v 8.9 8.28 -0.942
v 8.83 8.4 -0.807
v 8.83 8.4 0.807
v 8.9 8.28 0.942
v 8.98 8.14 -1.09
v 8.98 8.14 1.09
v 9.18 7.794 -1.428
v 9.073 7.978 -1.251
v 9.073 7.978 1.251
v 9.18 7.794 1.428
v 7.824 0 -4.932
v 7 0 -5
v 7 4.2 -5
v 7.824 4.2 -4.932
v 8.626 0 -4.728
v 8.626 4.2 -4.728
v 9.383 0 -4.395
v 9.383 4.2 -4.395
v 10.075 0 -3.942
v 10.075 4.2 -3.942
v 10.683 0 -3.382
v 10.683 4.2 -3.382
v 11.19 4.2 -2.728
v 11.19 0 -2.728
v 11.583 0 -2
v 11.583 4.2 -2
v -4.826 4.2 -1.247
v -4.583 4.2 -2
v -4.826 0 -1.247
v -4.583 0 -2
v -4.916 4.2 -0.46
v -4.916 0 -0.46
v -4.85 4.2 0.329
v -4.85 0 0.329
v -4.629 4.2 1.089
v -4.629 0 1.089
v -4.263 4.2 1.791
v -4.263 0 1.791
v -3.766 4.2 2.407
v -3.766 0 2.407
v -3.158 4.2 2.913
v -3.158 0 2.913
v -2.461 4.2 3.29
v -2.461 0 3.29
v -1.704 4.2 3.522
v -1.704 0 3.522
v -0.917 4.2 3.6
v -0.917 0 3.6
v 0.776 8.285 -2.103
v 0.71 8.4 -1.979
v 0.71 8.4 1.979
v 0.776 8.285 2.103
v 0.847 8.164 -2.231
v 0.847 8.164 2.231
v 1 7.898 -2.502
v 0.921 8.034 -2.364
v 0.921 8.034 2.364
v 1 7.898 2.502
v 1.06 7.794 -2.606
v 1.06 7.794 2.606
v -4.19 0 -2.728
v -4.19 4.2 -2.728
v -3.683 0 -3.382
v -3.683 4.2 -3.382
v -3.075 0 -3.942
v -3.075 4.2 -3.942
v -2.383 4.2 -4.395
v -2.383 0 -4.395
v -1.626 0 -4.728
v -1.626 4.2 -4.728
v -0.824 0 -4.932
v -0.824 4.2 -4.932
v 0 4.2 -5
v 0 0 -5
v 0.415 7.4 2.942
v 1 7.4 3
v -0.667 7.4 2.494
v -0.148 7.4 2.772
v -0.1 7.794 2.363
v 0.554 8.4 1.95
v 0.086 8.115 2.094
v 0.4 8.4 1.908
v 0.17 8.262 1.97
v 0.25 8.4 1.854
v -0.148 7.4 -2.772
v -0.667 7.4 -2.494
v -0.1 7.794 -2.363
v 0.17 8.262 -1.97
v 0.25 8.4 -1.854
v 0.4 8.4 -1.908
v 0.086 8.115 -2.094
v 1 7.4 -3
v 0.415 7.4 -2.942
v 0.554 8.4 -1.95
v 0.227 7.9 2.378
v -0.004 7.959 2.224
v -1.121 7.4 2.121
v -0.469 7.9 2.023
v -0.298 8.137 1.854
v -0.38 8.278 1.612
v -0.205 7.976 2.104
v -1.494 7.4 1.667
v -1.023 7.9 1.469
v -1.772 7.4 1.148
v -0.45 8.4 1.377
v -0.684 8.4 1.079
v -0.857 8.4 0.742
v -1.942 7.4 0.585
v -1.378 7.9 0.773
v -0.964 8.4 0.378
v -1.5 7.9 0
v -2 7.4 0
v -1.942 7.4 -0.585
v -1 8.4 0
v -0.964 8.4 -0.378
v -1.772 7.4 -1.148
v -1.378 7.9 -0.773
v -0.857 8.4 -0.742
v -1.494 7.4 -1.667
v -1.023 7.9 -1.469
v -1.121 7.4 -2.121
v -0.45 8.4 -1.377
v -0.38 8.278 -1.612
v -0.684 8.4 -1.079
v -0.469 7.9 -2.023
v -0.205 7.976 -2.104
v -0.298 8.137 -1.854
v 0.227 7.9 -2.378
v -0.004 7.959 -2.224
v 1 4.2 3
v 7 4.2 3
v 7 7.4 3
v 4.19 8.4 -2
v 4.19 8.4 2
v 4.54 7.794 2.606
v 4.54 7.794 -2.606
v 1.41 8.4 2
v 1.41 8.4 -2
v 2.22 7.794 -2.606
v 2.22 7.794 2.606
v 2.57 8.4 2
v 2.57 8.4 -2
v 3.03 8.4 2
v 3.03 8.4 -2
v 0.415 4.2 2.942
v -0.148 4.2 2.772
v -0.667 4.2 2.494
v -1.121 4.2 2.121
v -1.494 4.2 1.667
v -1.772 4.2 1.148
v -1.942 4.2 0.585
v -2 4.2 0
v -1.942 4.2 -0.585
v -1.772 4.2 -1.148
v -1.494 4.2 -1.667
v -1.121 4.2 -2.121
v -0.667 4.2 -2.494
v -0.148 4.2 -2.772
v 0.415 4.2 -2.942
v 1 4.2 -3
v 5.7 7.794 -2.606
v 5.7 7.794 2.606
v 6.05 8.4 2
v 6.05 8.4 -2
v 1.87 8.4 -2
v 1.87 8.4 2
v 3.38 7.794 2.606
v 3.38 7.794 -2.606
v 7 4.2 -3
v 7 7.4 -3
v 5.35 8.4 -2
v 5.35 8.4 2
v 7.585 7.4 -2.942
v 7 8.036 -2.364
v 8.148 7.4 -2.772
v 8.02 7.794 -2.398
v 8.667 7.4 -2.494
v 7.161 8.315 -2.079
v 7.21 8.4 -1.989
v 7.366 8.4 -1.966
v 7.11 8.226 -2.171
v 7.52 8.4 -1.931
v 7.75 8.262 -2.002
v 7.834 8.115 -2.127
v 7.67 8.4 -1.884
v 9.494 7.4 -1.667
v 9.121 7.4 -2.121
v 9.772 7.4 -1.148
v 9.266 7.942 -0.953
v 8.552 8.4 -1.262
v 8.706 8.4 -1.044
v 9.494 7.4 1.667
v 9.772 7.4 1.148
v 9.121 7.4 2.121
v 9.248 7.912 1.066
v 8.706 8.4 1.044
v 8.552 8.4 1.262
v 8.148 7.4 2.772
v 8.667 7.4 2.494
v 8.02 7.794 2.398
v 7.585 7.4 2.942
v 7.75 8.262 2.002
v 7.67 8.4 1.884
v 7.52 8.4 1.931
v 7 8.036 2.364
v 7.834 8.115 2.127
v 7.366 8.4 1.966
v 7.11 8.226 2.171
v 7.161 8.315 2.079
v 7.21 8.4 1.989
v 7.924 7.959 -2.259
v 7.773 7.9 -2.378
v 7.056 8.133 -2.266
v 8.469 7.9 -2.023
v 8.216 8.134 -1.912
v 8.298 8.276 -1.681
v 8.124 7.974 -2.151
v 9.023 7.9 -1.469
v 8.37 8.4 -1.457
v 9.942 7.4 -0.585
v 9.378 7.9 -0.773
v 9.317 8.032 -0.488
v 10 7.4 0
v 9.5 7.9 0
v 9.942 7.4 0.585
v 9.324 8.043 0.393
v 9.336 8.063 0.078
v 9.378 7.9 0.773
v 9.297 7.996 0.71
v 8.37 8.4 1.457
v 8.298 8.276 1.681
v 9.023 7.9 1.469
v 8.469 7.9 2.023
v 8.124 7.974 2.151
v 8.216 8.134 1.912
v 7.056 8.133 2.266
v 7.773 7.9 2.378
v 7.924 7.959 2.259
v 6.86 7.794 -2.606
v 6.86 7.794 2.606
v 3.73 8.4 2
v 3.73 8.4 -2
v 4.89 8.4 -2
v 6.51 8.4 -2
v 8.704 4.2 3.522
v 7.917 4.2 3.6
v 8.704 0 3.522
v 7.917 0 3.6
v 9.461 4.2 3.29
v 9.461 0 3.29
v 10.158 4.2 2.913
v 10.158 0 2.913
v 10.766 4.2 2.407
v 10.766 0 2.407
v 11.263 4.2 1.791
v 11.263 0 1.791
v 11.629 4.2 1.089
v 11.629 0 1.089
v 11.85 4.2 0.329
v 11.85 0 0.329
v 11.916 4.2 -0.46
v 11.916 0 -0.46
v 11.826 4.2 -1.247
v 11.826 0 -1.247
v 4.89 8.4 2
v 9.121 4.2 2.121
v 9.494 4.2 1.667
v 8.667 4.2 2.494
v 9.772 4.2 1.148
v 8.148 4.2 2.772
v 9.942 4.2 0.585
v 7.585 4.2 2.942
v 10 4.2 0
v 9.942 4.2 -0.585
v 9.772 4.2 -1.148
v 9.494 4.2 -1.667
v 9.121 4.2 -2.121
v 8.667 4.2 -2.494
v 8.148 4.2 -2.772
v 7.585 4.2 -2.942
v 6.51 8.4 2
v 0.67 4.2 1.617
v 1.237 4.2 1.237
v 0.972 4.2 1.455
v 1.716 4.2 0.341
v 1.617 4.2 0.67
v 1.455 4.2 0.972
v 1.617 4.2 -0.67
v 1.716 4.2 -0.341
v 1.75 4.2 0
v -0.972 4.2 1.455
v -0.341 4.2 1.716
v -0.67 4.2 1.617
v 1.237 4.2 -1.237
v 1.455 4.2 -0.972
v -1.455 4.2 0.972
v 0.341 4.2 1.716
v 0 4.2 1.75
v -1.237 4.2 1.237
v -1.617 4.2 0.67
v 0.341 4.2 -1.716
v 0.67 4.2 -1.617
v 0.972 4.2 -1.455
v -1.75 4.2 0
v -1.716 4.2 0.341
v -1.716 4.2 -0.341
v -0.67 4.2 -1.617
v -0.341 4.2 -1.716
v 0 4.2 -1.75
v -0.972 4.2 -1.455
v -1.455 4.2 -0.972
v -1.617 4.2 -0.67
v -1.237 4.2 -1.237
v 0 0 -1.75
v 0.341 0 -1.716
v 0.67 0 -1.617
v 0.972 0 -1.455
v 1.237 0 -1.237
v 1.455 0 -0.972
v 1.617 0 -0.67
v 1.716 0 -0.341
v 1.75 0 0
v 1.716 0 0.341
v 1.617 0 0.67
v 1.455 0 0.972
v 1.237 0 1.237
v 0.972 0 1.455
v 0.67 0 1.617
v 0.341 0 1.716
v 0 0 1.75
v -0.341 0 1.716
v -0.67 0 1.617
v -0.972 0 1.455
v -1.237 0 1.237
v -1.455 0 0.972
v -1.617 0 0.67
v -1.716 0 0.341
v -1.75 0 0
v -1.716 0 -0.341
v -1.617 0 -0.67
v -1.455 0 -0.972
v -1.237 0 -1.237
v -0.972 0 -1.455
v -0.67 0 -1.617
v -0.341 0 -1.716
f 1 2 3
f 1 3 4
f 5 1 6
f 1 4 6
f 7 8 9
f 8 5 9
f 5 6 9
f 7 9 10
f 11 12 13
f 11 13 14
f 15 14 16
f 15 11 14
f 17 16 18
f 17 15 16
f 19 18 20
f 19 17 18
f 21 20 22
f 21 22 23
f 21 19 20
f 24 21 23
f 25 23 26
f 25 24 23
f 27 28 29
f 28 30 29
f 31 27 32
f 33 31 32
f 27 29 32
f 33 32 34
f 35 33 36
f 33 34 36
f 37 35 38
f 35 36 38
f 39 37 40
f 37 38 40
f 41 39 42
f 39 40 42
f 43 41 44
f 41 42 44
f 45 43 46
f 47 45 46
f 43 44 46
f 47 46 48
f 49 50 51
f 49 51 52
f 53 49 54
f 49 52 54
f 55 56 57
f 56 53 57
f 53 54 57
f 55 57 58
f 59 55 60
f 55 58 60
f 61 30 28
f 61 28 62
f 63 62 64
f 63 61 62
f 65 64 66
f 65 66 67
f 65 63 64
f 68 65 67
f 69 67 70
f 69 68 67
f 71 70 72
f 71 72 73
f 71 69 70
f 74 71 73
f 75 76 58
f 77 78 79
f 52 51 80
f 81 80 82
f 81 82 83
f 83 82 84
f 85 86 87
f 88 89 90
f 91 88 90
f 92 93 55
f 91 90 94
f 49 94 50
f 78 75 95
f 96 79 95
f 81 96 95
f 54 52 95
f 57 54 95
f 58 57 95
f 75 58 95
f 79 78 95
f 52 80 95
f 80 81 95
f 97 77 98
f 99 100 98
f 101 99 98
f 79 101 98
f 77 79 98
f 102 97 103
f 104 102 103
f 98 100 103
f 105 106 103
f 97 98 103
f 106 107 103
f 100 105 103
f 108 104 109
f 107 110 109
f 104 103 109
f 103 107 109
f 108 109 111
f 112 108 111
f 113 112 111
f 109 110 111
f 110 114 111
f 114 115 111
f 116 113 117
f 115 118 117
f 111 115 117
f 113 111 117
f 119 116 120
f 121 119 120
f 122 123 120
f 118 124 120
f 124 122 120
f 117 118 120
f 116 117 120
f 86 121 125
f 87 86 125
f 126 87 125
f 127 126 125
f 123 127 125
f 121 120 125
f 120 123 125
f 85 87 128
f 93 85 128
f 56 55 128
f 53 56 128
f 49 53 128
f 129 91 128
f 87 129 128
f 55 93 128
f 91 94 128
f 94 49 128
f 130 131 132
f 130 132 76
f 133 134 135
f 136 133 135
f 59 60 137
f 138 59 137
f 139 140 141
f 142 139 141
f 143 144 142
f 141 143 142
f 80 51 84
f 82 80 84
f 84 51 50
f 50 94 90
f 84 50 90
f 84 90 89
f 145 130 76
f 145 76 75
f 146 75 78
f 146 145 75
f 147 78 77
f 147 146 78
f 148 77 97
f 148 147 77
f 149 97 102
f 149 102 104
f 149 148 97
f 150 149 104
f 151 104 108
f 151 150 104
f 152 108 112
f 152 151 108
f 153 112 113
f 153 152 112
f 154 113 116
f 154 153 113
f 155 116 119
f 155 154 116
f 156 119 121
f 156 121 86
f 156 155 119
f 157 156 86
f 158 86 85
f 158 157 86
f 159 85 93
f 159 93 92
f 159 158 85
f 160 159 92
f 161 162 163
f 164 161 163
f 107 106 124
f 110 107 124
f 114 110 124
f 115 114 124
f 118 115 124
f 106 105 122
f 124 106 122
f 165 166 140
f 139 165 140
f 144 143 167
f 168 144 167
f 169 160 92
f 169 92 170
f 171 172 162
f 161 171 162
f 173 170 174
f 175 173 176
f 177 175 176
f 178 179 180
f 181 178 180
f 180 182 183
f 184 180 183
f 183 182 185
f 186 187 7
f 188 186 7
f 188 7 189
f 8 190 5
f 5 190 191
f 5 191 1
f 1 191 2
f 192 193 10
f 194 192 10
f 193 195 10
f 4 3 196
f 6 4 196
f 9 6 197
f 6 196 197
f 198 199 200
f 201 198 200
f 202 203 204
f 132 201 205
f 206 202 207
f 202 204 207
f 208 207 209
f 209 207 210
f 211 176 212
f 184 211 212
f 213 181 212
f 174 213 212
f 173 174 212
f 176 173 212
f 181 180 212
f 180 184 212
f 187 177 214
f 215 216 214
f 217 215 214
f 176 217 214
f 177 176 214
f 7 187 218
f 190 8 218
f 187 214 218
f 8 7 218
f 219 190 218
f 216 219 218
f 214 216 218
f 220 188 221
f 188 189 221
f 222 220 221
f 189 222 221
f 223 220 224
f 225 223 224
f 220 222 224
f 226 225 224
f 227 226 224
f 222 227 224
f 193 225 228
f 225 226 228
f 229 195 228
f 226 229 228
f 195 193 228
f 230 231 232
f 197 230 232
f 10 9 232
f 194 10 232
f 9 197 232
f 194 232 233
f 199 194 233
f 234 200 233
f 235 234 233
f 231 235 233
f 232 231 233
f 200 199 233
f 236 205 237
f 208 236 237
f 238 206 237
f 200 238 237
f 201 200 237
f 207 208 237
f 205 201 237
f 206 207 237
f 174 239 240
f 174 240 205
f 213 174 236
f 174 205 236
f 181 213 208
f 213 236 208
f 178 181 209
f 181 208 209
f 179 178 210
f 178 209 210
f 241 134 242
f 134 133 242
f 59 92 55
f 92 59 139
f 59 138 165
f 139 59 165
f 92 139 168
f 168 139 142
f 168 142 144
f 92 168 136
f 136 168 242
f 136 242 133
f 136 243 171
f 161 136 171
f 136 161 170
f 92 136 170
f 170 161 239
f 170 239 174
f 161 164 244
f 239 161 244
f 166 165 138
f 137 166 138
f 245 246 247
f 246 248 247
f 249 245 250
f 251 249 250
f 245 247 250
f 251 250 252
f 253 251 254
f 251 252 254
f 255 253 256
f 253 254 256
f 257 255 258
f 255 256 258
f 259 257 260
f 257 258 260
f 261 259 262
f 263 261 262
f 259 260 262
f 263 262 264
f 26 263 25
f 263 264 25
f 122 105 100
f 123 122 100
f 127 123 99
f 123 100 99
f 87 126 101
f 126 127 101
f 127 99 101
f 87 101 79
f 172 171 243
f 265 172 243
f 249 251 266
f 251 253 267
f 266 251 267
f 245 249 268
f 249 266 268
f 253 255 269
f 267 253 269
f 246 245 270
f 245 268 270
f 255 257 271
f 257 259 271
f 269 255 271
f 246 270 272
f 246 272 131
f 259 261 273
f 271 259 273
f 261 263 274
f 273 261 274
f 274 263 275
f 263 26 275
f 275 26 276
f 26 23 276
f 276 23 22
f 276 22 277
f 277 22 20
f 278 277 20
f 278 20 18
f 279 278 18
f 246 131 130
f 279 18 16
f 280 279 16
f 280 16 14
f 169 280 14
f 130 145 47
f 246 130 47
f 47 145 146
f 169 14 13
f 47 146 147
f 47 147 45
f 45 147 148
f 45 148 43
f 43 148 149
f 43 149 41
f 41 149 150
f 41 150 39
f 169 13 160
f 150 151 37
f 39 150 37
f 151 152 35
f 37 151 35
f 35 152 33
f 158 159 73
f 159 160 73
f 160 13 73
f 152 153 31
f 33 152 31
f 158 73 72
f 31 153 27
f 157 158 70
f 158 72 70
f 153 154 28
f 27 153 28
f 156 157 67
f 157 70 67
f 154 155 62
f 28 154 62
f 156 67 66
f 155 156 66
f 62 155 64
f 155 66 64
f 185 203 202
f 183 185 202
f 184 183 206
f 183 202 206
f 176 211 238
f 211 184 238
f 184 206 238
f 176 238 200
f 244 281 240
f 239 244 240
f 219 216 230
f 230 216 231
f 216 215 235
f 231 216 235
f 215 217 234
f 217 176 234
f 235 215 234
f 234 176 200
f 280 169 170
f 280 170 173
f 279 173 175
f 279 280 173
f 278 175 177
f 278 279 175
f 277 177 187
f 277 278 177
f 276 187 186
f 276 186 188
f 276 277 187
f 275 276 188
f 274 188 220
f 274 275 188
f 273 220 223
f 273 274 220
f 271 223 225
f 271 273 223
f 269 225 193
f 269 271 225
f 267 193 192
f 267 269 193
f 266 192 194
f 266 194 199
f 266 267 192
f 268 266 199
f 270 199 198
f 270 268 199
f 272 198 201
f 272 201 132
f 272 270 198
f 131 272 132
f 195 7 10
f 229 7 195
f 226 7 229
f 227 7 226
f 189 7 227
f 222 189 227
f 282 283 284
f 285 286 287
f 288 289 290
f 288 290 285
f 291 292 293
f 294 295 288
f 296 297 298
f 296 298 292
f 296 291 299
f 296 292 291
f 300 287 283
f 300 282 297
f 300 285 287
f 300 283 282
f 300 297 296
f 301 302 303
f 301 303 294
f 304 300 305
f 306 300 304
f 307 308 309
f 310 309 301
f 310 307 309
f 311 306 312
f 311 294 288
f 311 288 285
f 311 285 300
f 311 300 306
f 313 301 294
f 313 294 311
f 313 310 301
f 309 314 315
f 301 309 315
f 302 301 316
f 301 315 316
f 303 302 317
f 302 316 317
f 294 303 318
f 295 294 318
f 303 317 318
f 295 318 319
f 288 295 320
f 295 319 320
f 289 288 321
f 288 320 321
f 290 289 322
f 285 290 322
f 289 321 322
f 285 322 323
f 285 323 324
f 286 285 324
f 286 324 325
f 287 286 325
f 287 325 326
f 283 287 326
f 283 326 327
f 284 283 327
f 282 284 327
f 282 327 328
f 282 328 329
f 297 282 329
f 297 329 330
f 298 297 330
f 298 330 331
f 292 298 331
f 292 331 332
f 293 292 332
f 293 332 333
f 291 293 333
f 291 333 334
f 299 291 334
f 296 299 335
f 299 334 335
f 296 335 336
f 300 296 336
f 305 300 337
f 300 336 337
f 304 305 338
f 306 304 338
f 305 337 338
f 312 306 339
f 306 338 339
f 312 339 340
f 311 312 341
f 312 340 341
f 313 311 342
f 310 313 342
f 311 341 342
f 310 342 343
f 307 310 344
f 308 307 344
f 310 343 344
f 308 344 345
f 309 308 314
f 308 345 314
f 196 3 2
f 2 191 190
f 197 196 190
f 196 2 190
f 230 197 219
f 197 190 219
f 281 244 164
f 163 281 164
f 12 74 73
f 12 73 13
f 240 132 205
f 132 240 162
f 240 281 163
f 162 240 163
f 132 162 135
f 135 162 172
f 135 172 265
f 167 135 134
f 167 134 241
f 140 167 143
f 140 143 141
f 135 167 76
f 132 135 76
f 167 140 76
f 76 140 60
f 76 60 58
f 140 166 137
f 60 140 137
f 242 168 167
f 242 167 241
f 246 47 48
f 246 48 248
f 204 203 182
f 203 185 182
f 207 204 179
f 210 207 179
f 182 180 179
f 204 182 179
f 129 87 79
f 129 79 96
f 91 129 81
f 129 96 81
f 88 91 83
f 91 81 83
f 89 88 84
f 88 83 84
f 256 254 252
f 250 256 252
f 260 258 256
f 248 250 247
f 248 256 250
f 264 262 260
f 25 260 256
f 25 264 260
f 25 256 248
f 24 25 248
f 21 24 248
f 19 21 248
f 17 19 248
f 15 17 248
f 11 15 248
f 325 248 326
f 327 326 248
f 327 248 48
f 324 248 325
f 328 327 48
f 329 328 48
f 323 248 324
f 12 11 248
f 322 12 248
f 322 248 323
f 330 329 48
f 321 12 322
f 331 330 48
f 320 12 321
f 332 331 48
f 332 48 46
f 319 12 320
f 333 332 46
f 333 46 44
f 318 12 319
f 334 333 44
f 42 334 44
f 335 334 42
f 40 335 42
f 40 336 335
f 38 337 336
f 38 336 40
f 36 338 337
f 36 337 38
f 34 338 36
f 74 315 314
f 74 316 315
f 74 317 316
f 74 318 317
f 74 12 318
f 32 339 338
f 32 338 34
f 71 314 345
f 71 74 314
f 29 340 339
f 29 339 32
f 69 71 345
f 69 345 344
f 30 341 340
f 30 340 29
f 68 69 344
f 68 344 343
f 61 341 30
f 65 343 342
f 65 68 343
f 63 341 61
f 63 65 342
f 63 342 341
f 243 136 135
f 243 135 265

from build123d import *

# Parameters (mm, degrees)
EXTRUDE_1_DEPTH     = 4.2
CUT_EXTRUDE_1_REACH = 15.662
SKETCH_3_R          = 1.75
EXTRUDE_2_DEPTH     = 4.2
CHAMFER_1_SIZE      = 1
CUT_EXTRUDE_2_REACH = 15.662
SKETCH_5_W          = 13.93974063
SKETCH_5_H          = 1.4
FILLET_1_R          = 4
CUT_EXTRUDE_3_REACH = 18.927


with BuildPart() as part:
    # 草图1 → 凸台-拉伸1 (new body)
    with BuildSketch(Plane(origin=(0, 0, 0), x_dir=(1, 0, 0), z_dir=(0, 1, 0))):
        with BuildLine():
            Line((0, 5), (7, 5))
            ThreePointArc((7, 5), (12, 0), (7, -5))
            Line((7, -5), (0, -5))
            ThreePointArc((0, -5), (-5, 0), (0, 5))
        make_face()
    extrude(amount=EXTRUDE_1_DEPTH)

    # 草图3 → 切除-拉伸1 (cut, up to next)
    with BuildSketch(Plane.XZ, mode=Mode.PRIVATE) as cut_extrude_1_sk1:
        with Locations(Location((0, 0, 0), (0, 0, 270))):
            Circle(SKETCH_3_R)
    cut_extrude_1_tool1 = extrude(cut_extrude_1_sk1.sketch, amount=-CUT_EXTRUDE_1_REACH, mode=Mode.PRIVATE) & part.part
    add(cut_extrude_1_tool1.solids().sort_by_distance((0, 0, 0))[0], mode=Mode.SUBTRACT)

    # 草图4 → 凸台-拉伸2 (add)
    with BuildSketch(Plane(origin=(0, 4.2, 0), x_dir=(1, 0, 0), z_dir=(0, 1, 0))):
        with BuildLine():
            Line((1, 3), (7, 3))
            ThreePointArc((7, 3), (10, 0), (7, -3))
            Line((7, -3), (1, -3))
            ThreePointArc((1, -3), (-2, 0), (1, 3))
        make_face()
    extrude(amount=EXTRUDE_2_DEPTH)

    # 倒角1
    chamfer_1_edges = [part.edges().sort_by_distance(p)[0] for p in [
        (-2, 8.4, 0),
        (4, 8.4, 3),
        (10, 8.4, 0),
        (4, 8.4, -3),
    ]]
    chamfer(chamfer_1_edges, length=CHAMFER_1_SIZE)

    # 草图5 → 切除-拉伸2 (cut, up to next)
    with BuildSketch(Plane(origin=(0, 4.2, 0), x_dir=(1, 0, 0), z_dir=(0, 1, 0)), mode=Mode.PRIVATE) as cut_extrude_2_sk1:
        with Locations((3.5, -4.3)):
            Rectangle(SKETCH_5_W, SKETCH_5_H)
    cut_extrude_2_tool1 = extrude(cut_extrude_2_sk1.sketch, amount=-CUT_EXTRUDE_2_REACH, mode=Mode.PRIVATE) & part.part
    add(cut_extrude_2_tool1.solids().sort_by_distance((3.5, 4.2, 4.3))[0], mode=Mode.SUBTRACT)

    # 圆角1
    fillet_1_edges = [part.edges().sort_by_distance(p)[0] for p in [
        (-3.469870315, 2.1, 3.6),
        (10.469870315, 2.1, 3.6),
    ]]
    fillet(fillet_1_edges, radius=FILLET_1_R)

    # 草图6 → 切除-拉伸3 (cut, up to next)
    with BuildSketch(Plane.XY.offset(3.6), mode=Mode.PRIVATE) as cut_extrude_3_sk1:
        Polygon((-0.45, 8.4), (-0.1, 7.793782217), (0.25, 8.4), align=None)
    cut_extrude_3_tool1 = extrude(cut_extrude_3_sk1.sketch, amount=-CUT_EXTRUDE_3_REACH, mode=Mode.PRIVATE) & part.part
    # 草图6 → 切除-拉伸3 (cut, up to next)
    with BuildSketch(Plane.XY.offset(3.6), mode=Mode.PRIVATE) as cut_extrude_3_sk2:
        Polygon((1.41, 8.4), (0.71, 8.4), (1.06, 7.793782217), align=None)
    cut_extrude_3_tool2 = extrude(cut_extrude_3_sk2.sketch, amount=-CUT_EXTRUDE_3_REACH, mode=Mode.PRIVATE) & part.part
    # 草图6 → 切除-拉伸3 (cut, up to next)
    with BuildSketch(Plane.XY.offset(3.6), mode=Mode.PRIVATE) as cut_extrude_3_sk3:
        Polygon((2.57, 8.4), (1.87, 8.4), (2.22, 7.793782217), align=None)
    cut_extrude_3_tool3 = extrude(cut_extrude_3_sk3.sketch, amount=-CUT_EXTRUDE_3_REACH, mode=Mode.PRIVATE) & part.part
    # 草图6 → 切除-拉伸3 (cut, up to next)
    with BuildSketch(Plane.XY.offset(3.6), mode=Mode.PRIVATE) as cut_extrude_3_sk4:
        Polygon((3.73, 8.4), (3.03, 8.4), (3.38, 7.793782217), align=None)
    cut_extrude_3_tool4 = extrude(cut_extrude_3_sk4.sketch, amount=-CUT_EXTRUDE_3_REACH, mode=Mode.PRIVATE) & part.part
    # 草图6 → 切除-拉伸3 (cut, up to next)
    with BuildSketch(Plane.XY.offset(3.6), mode=Mode.PRIVATE) as cut_extrude_3_sk5:
        Polygon((4.89, 8.4), (4.19, 8.4), (4.54, 7.793782217), align=None)
    cut_extrude_3_tool5 = extrude(cut_extrude_3_sk5.sketch, amount=-CUT_EXTRUDE_3_REACH, mode=Mode.PRIVATE) & part.part
    # 草图6 → 切除-拉伸3 (cut, up to next)
    with BuildSketch(Plane.XY.offset(3.6), mode=Mode.PRIVATE) as cut_extrude_3_sk6:
        Polygon((6.05, 8.4), (5.35, 8.4), (5.7, 7.793782217), align=None)
    cut_extrude_3_tool6 = extrude(cut_extrude_3_sk6.sketch, amount=-CUT_EXTRUDE_3_REACH, mode=Mode.PRIVATE) & part.part
    # 草图6 → 切除-拉伸3 (cut, up to next)
    with BuildSketch(Plane.XY.offset(3.6), mode=Mode.PRIVATE) as cut_extrude_3_sk7:
        Polygon((7.21, 8.4), (6.51, 8.4), (6.86, 7.793782217), align=None)
    cut_extrude_3_tool7 = extrude(cut_extrude_3_sk7.sketch, amount=-CUT_EXTRUDE_3_REACH, mode=Mode.PRIVATE) & part.part
    # 草图6 → 切除-拉伸3 (cut, up to next)
    with BuildSketch(Plane.XY.offset(3.6), mode=Mode.PRIVATE) as cut_extrude_3_sk8:
        Polygon((8.37, 8.4), (7.67, 8.4), (8.02, 7.793782217), align=None)
    cut_extrude_3_tool8 = extrude(cut_extrude_3_sk8.sketch, amount=-CUT_EXTRUDE_3_REACH, mode=Mode.PRIVATE) & part.part
    # 草图6 → 切除-拉伸3 (cut, up to next)
    with BuildSketch(Plane.XY.offset(3.6), mode=Mode.PRIVATE) as cut_extrude_3_sk9:
        Polygon((9.53, 8.4), (8.83, 8.4), (9.18, 7.793782217), align=None)
    cut_extrude_3_tool9 = extrude(cut_extrude_3_sk9.sketch, amount=-CUT_EXTRUDE_3_REACH, mode=Mode.PRIVATE) & part.part
    add(cut_extrude_3_tool1.solids().sort_by_distance((-0.1, 8.197927, 3.6))[0], mode=Mode.SUBTRACT)
    add(cut_extrude_3_tool2.solids().sort_by_distance((1.06, 8.197927, 3.6))[0], mode=Mode.SUBTRACT)
    add(cut_extrude_3_tool3.solids().sort_by_distance((2.22, 8.197927, 3.6))[0], mode=Mode.SUBTRACT)
    add(cut_extrude_3_tool4.solids().sort_by_distance((3.38, 8.197927, 3.6))[0], mode=Mode.SUBTRACT)
    add(cut_extrude_3_tool5.solids().sort_by_distance((4.54, 8.197927, 3.6))[0], mode=Mode.SUBTRACT)
    add(cut_extrude_3_tool6.solids().sort_by_distance((5.7, 8.197927, 3.6))[0], mode=Mode.SUBTRACT)
    add(cut_extrude_3_tool7.solids().sort_by_distance((6.86, 8.197927, 3.6))[0], mode=Mode.SUBTRACT)
    add(cut_extrude_3_tool8.solids().sort_by_distance((8.02, 8.197927, 3.6))[0], mode=Mode.SUBTRACT)
    add(cut_extrude_3_tool9.solids().sort_by_distance((9.18, 8.197927, 3.6))[0], mode=Mode.SUBTRACT)


solid = part.part
